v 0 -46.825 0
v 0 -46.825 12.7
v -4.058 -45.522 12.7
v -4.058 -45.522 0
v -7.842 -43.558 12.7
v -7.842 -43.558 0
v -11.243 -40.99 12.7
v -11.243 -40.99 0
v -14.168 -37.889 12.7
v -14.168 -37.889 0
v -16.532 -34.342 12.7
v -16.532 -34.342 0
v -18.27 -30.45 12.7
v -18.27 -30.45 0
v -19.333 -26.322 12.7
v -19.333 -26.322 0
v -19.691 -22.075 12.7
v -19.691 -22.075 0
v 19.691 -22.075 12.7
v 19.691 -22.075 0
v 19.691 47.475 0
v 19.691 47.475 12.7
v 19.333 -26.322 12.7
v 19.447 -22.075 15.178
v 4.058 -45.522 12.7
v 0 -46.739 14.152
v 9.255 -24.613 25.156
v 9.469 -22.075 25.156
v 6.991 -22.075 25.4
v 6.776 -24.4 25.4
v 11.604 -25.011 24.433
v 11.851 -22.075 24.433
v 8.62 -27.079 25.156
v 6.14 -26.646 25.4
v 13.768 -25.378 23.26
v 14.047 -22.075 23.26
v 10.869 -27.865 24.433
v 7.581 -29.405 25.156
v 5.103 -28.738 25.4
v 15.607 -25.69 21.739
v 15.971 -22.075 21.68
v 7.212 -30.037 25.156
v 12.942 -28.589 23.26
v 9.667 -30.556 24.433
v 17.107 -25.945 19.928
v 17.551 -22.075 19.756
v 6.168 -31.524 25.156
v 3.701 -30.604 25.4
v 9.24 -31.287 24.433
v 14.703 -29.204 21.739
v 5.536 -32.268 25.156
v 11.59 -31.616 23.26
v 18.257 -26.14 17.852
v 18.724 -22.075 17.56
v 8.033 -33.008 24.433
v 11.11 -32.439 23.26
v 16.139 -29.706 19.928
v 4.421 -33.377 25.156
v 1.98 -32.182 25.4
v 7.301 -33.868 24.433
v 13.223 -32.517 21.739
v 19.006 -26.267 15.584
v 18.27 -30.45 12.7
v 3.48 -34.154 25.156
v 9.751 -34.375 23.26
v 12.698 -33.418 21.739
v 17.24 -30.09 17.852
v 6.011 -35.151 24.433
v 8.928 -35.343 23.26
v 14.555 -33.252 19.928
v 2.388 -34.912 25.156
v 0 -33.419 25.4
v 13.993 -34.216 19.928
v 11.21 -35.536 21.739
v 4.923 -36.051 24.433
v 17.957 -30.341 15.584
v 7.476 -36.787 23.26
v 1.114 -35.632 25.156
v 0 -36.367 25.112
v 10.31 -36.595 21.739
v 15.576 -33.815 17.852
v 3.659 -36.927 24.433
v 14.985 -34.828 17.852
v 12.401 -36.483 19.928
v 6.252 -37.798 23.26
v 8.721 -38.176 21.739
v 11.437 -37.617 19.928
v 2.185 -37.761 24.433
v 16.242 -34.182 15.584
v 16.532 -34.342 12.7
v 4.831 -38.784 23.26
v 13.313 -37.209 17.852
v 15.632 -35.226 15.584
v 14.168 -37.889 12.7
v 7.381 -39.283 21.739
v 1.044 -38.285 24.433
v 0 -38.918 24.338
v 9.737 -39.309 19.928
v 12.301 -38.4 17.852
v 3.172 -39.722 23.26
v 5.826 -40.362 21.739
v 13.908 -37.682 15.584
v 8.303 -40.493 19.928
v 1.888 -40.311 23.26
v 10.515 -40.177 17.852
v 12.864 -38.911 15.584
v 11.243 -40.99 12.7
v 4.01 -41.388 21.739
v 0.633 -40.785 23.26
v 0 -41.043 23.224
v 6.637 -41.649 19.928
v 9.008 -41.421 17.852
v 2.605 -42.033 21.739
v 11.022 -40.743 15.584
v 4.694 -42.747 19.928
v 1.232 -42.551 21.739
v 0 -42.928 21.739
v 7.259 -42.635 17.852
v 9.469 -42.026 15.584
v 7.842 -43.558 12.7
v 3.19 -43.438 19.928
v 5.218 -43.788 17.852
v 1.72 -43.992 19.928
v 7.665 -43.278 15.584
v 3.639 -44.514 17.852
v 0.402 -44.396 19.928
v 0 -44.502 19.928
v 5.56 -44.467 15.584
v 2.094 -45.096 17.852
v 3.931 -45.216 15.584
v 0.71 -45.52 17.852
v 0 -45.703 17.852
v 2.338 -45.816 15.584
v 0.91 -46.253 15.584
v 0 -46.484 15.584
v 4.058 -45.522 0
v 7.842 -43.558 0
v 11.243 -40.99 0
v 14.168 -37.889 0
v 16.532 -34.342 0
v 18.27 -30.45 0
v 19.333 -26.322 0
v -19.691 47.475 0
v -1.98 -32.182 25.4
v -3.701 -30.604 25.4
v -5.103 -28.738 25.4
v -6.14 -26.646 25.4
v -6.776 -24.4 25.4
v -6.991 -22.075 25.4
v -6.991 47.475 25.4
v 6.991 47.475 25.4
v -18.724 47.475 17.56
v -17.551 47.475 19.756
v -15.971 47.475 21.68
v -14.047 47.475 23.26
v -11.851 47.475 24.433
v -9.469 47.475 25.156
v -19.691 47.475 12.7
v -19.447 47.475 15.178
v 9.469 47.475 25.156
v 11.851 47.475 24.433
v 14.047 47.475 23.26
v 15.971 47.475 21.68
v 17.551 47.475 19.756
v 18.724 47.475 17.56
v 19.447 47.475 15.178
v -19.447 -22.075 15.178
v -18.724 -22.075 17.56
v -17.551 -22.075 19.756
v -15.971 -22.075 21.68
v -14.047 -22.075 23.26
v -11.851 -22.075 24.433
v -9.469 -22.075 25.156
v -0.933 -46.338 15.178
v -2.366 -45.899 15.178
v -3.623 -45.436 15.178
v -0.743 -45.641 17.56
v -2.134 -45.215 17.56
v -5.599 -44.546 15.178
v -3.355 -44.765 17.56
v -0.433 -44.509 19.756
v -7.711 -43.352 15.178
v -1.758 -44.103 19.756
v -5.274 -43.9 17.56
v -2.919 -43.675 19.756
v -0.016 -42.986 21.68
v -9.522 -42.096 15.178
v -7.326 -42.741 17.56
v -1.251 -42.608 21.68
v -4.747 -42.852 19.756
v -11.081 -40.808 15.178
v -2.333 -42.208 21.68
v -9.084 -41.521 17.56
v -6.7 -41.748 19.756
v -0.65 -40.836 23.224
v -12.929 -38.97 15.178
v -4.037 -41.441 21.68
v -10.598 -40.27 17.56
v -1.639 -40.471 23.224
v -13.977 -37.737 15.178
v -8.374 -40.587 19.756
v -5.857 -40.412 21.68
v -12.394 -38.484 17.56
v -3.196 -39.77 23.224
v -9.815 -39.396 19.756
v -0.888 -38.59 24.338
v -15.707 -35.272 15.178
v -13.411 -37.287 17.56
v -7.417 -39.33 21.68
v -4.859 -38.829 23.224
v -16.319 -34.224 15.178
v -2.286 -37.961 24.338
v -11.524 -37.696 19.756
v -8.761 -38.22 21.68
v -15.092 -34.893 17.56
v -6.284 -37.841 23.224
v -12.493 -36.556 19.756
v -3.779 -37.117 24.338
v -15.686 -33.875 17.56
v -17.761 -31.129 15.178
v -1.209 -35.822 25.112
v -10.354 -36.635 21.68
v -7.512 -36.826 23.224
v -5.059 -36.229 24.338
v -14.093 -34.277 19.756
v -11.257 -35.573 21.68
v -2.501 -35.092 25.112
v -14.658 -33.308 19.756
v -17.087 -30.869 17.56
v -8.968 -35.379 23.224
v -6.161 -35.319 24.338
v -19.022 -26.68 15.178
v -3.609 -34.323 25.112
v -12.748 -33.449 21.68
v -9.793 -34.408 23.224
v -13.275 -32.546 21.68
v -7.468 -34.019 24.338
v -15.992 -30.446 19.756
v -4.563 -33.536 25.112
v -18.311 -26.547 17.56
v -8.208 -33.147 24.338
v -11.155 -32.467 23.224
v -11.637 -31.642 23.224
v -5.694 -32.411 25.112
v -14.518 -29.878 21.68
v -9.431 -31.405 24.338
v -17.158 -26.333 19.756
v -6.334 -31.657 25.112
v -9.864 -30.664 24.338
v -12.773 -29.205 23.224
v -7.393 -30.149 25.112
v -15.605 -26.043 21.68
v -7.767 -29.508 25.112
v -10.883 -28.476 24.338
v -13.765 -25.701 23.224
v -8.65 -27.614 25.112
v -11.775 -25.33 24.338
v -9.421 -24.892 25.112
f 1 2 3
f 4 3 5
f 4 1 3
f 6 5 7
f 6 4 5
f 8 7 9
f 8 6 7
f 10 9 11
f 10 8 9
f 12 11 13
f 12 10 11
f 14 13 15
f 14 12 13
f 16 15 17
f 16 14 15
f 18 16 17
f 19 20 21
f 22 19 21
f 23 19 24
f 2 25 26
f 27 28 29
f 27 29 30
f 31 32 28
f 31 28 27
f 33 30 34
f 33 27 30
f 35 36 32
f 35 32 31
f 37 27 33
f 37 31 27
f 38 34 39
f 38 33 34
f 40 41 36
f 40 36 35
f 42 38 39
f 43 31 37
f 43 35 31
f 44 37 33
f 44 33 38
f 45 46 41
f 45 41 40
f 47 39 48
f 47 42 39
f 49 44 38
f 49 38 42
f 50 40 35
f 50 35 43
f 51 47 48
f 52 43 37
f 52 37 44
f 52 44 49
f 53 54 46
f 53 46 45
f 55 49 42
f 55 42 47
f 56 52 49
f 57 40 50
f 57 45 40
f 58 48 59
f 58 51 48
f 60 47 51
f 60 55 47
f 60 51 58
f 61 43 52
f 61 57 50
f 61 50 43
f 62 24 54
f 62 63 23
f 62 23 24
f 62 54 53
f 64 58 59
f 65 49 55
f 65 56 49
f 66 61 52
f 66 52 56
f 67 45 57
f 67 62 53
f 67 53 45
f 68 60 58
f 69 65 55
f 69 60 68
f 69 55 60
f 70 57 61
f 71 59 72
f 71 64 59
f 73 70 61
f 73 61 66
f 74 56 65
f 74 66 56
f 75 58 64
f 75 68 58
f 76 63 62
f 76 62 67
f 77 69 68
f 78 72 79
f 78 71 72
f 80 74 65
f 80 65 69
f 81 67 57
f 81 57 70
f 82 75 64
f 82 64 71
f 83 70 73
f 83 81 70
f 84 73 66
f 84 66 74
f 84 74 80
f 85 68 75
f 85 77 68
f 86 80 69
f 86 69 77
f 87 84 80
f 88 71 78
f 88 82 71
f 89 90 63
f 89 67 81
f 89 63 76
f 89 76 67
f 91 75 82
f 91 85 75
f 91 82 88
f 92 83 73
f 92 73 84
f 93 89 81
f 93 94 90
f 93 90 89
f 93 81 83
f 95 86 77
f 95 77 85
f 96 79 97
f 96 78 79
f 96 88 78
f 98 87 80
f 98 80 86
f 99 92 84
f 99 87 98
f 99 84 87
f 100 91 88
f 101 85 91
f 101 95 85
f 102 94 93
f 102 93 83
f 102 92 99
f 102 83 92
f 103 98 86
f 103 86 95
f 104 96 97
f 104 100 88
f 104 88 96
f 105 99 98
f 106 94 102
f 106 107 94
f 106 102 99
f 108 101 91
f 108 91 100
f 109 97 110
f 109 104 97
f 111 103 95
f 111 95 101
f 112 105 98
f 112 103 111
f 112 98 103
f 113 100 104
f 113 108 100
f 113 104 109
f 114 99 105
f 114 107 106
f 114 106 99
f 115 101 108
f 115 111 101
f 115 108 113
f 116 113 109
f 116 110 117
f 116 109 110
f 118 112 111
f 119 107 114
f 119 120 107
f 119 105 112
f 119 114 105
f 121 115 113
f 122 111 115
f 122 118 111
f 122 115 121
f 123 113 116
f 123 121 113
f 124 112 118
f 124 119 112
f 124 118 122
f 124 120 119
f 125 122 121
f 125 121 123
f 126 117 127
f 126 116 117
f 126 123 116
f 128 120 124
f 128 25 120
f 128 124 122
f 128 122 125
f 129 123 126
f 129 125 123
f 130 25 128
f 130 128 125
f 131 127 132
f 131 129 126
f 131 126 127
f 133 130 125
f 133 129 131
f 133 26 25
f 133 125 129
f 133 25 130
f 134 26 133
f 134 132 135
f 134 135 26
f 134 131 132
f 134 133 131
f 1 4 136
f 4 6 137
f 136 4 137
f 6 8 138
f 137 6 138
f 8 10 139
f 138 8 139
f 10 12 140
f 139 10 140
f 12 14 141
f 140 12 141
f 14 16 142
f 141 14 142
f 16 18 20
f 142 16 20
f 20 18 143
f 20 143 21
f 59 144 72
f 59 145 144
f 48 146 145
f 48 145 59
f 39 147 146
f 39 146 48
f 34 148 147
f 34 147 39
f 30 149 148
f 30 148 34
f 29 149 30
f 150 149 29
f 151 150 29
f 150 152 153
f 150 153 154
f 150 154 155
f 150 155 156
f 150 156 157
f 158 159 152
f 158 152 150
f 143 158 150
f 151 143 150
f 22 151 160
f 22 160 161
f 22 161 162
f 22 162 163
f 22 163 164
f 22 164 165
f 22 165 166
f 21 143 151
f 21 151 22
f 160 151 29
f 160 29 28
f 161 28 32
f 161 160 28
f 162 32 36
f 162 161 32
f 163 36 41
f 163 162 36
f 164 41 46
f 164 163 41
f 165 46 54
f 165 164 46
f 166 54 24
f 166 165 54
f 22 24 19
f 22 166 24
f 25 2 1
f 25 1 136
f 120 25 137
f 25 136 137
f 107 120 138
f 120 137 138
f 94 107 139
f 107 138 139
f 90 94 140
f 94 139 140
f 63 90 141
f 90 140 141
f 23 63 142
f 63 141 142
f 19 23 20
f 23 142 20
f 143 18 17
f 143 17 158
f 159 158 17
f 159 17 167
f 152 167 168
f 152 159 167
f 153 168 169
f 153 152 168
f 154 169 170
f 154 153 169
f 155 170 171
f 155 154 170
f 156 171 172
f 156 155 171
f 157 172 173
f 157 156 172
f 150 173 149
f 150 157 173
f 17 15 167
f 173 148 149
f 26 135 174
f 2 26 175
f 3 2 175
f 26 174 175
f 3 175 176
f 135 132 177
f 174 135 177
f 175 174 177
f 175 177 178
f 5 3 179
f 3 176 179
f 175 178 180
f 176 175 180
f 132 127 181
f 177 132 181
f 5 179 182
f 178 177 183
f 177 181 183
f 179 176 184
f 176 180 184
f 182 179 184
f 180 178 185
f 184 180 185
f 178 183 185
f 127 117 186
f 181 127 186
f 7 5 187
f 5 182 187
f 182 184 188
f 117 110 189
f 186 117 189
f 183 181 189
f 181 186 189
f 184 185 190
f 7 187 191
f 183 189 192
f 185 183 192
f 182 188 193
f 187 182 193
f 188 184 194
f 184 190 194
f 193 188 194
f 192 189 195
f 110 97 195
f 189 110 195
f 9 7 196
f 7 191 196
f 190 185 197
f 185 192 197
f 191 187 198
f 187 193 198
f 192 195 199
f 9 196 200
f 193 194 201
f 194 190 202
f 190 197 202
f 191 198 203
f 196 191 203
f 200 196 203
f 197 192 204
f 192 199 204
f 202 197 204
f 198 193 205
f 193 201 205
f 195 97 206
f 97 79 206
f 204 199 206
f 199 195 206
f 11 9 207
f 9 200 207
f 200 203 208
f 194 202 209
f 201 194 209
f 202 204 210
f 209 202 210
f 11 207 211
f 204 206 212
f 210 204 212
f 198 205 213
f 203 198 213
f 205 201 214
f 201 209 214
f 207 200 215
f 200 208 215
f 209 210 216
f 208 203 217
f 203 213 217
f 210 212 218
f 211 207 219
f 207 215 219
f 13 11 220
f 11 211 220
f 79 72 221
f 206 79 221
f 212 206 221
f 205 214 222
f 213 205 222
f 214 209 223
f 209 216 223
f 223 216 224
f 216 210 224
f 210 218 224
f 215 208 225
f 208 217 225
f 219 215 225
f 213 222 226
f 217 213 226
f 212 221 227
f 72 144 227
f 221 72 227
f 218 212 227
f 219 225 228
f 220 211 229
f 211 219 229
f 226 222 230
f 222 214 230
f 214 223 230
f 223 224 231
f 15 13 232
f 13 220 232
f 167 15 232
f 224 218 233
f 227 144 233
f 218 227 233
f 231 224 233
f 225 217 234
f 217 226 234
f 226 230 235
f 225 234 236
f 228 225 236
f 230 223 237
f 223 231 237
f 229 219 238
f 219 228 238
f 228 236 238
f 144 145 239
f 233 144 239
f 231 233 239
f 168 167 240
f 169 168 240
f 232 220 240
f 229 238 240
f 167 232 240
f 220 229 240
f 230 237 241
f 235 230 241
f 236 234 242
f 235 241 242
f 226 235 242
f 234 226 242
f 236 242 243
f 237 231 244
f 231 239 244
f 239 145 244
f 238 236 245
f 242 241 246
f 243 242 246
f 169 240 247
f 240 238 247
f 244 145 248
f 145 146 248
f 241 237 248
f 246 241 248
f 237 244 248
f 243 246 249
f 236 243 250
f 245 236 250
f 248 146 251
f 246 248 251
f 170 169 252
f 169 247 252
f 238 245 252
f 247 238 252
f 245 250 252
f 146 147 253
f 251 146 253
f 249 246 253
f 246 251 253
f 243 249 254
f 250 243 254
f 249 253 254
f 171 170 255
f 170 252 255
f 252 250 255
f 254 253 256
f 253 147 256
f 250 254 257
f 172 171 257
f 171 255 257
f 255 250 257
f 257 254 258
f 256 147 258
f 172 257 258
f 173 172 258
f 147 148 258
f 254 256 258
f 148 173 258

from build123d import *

# Parameters (mm, degrees)
F0_W        = 39.3818542361
F0_H        = 94.9496030807
F1_DEPTH    = 25.4
F2_T1_DEPTH = 152.4
F3_T1_DEPTH = 101.2996030808
F3_T4_ANGLE = 148.6516311692
F3_T6_ANGLE = 148.6516311692


# Not quite as in the source:
# - a fillet or chamfer that OpenCascade refuses, or shapes differently, is made with other operations: its cross-section is extruded or revolved along the edge and cut away or added


with BuildPart() as f1:
    # F0 (on Top) → F1 (new body)
    with BuildSketch(Plane.XY):
        Rectangle(F0_W, F0_H)
    extrude(amount=F1_DEPTH)

    # F2: fillet of radius 25.4 on 2 edges, made by hand

    # F2_s2 → F2_t1 (cut)
    with BuildSketch(Plane.XY.offset(-63.5)):
        with BuildLine():
            ThreePointArc((-5.7090728819, -47.4748015404), (12.2514393602, -40.0353137825), (19.6909271181, -22.0748015404))
            Line((19.6909271181, -22.0748015404), (19.6909271181, -47.4748015404))
            Line((19.6909271181, -47.4748015404), (-5.7090728819, -47.4748015404))
        make_face()
        with BuildLine():
            ThreePointArc((5.7090728819, -47.4748015404), (-12.2514393602, -40.0353137825), (-19.6909271181, -22.0748015404))
            Line((-19.6909271181, -22.0748015404), (-19.6909271181, -47.4748015404))
            Line((-19.6909271181, -47.4748015404), (5.7090728819, -47.4748015404))
        make_face()
    extrude(amount=F2_T1_DEPTH, mode=Mode.SUBTRACT)

    # F3: fillet of radius 12.7 on 4 edges, made by hand

    # F3_s2 → F3_t1 (cut)
    with BuildSketch(Plane.XZ.offset(-79.2248015404)):
        with BuildLine():
            ThreePointArc((6.9909271181, 25.4), (15.9711832391, 21.6802561211), (19.6909271181, 12.7))
            Line((19.6909271181, 12.7), (19.6909271181, 25.4))
            Line((19.6909271181, 25.4), (6.9909271181, 25.4))
        make_face()
        with BuildLine():
            ThreePointArc((-19.6909271181, 12.7), (-15.9711832391, 21.6802561211), (-6.9909271181, 25.4))
            Line((-6.9909271181, 25.4), (-19.6909271181, 25.4))
            Line((-19.6909271181, 25.4), (-19.6909271181, 12.7))
        make_face()
    extrude(amount=F3_T1_DEPTH, mode=Mode.SUBTRACT)

    # F3_s3 → F3_t4 (revolve, cut)
    with BuildSketch(Plane.XZ.offset(22.0748015403)):
        with BuildLine():
            ThreePointArc((6.9909271181, 25.4), (15.9711832392, 21.6802561211), (19.6909271181, 12.7))
            Line((19.6909271181, 12.7), (19.6909271181, 25.4))
            Line((19.6909271181, 25.4), (6.9909271181, 25.4))
        make_face()
    revolve(axis=Axis((-5.709072882, -22.0748015403, 25.4), (0, 0, -1)), revolution_arc=F3_T4_ANGLE, mode=Mode.SUBTRACT)

    # F3_s5 → F3_t6 (revolve, cut)
    with BuildSketch(Plane(origin=(-8.2625761257, -13.5637424397, 0), x_dir=(0, 0, 1), z_dir=(0.5202402568, 0.8540199501, 0))):
        with BuildLine():
            ThreePointArc((12.7, 41.759862561), (21.6802561211, 38.040118682), (25.4, 29.059862561))
            Line((25.4, 29.059862561), (25.4, 41.759862561))
            Line((25.4, 41.759862561), (12.7, 41.759862561))
        make_face()
    revolve(axis=Axis((5.709072882, -22.0748015403, 25.4), (0, 0, -1)), revolution_arc=F3_T6_ANGLE, mode=Mode.SUBTRACT)


solid = f1.part
